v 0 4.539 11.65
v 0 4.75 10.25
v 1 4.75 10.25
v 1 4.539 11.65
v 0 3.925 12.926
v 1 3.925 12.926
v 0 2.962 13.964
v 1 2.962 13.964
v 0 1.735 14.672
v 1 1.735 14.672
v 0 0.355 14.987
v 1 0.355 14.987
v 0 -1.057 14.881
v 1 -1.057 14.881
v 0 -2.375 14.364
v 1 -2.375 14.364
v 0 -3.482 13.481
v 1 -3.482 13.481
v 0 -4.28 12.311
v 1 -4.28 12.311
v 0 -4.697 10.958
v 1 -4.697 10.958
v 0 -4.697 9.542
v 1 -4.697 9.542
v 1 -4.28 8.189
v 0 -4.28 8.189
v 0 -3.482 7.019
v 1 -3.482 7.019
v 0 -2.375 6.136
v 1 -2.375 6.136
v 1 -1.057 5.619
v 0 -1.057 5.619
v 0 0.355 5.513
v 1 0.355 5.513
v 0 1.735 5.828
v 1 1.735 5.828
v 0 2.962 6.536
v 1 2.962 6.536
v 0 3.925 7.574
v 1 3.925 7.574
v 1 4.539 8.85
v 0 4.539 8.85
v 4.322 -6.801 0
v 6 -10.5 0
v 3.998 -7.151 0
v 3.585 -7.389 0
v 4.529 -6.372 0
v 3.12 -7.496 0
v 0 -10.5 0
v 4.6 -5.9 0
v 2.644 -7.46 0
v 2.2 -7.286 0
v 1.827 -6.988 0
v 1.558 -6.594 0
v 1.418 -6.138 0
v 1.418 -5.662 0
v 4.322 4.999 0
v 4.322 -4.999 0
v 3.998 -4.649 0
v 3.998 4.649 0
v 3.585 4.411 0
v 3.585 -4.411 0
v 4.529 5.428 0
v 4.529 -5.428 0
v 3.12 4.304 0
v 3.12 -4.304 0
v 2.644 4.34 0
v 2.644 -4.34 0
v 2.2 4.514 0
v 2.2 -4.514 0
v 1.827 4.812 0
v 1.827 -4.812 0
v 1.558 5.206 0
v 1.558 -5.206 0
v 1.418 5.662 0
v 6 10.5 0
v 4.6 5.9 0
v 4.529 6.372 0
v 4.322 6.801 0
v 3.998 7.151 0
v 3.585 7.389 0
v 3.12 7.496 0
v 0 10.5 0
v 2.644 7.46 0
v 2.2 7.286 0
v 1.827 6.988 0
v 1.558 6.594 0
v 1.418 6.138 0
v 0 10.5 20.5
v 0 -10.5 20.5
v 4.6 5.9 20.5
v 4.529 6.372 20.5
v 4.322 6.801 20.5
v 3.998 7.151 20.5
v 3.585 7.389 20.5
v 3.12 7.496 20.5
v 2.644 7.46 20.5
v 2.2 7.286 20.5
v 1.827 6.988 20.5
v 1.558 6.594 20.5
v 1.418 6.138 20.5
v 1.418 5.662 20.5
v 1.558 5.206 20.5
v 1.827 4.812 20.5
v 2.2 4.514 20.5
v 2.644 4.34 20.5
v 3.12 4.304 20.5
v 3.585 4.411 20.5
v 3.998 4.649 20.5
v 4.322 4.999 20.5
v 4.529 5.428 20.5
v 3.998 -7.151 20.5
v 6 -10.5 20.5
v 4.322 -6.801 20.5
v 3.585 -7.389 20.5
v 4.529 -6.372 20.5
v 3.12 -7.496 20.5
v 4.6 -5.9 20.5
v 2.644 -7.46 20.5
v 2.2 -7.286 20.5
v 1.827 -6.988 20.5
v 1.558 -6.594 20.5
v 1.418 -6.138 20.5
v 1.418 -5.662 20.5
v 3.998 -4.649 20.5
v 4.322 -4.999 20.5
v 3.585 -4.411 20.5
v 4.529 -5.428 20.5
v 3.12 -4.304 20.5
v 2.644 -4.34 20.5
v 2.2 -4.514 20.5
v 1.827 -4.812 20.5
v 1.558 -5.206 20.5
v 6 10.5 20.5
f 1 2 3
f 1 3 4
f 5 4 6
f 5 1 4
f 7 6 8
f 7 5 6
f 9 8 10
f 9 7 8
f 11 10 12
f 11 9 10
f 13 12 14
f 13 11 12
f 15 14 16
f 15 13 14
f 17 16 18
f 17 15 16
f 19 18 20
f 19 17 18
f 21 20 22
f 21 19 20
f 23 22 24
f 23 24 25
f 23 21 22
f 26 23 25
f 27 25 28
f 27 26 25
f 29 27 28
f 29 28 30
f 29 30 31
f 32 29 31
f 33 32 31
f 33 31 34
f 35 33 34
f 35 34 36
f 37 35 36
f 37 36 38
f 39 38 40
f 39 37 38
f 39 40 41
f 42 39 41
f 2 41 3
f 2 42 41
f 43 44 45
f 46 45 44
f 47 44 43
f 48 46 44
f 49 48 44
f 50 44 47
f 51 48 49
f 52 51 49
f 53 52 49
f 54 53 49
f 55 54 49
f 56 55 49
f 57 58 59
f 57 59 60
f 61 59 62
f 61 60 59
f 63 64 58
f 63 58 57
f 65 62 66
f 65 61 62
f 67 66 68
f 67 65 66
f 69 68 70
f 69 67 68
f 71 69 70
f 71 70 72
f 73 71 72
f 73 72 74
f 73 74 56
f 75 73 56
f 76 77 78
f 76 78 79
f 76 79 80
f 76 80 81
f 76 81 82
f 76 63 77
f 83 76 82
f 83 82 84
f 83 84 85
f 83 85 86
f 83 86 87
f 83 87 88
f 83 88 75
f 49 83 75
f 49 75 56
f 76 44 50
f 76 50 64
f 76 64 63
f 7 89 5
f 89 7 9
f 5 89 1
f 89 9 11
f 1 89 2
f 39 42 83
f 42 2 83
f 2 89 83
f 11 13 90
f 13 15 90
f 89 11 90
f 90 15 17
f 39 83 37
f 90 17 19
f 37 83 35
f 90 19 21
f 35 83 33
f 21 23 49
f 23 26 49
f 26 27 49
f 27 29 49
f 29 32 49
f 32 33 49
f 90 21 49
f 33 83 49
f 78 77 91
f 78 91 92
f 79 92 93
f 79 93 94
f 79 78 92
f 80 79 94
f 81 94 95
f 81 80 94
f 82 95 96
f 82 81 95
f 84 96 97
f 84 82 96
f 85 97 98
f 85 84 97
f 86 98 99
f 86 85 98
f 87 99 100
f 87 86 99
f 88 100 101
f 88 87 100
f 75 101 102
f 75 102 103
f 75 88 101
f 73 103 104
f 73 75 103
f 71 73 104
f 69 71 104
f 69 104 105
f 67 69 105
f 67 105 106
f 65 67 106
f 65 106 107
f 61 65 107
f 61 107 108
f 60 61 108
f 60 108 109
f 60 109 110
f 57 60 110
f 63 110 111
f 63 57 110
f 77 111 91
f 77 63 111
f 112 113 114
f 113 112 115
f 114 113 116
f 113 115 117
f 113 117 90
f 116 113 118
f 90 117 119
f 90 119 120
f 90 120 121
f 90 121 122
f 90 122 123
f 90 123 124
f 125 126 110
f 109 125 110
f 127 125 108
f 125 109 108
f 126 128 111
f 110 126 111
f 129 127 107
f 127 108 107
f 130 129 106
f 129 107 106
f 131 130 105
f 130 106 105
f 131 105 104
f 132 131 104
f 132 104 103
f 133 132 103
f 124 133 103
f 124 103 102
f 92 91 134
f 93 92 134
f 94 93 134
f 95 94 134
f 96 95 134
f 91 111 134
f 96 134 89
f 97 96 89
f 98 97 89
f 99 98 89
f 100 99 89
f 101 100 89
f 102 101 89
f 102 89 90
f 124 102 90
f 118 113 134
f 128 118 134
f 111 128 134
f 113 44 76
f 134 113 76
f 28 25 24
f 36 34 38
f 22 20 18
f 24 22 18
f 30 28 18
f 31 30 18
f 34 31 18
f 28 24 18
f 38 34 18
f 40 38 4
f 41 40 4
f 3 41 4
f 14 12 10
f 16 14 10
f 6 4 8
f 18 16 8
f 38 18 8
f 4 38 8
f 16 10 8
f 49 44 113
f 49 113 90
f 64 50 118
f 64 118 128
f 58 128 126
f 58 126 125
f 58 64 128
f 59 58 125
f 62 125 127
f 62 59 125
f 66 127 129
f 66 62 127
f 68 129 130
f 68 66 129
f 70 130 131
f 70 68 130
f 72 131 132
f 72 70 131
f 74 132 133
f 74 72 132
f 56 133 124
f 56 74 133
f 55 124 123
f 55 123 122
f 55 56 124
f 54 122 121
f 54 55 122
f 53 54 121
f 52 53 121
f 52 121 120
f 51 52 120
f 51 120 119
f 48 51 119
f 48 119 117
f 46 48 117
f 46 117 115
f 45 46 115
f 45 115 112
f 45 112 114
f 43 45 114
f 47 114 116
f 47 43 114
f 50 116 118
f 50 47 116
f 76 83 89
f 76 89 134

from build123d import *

# Parameters (mm, degrees)
SKETCH_R     = 1.6
PAD_DEPTH    = 20.5
SKETCH001_R  = 4.75
POCKET_DEPTH = 1


with BuildPart() as part:
    # Sketch → Pad (new body)
    with BuildSketch(Plane.XY):
        Polygon((0, 0), (0, 10.5), (6, 10.5), (6, 0), (6, -10.5), (0, -10.5), align=None)
        with Locations((3, 5.9)):
            Circle(SKETCH_R, mode=Mode.SUBTRACT)
        with Locations((3, -5.9)):
            Circle(SKETCH_R, mode=Mode.SUBTRACT)
    extrude(amount=PAD_DEPTH)

    # Sketch001 → Pocket (cut)
    with BuildSketch(Plane.YZ):
        with Locations((0, 10.25)):
            Circle(SKETCH001_R)
    extrude(amount=POCKET_DEPTH, mode=Mode.SUBTRACT)


solid = part.part
